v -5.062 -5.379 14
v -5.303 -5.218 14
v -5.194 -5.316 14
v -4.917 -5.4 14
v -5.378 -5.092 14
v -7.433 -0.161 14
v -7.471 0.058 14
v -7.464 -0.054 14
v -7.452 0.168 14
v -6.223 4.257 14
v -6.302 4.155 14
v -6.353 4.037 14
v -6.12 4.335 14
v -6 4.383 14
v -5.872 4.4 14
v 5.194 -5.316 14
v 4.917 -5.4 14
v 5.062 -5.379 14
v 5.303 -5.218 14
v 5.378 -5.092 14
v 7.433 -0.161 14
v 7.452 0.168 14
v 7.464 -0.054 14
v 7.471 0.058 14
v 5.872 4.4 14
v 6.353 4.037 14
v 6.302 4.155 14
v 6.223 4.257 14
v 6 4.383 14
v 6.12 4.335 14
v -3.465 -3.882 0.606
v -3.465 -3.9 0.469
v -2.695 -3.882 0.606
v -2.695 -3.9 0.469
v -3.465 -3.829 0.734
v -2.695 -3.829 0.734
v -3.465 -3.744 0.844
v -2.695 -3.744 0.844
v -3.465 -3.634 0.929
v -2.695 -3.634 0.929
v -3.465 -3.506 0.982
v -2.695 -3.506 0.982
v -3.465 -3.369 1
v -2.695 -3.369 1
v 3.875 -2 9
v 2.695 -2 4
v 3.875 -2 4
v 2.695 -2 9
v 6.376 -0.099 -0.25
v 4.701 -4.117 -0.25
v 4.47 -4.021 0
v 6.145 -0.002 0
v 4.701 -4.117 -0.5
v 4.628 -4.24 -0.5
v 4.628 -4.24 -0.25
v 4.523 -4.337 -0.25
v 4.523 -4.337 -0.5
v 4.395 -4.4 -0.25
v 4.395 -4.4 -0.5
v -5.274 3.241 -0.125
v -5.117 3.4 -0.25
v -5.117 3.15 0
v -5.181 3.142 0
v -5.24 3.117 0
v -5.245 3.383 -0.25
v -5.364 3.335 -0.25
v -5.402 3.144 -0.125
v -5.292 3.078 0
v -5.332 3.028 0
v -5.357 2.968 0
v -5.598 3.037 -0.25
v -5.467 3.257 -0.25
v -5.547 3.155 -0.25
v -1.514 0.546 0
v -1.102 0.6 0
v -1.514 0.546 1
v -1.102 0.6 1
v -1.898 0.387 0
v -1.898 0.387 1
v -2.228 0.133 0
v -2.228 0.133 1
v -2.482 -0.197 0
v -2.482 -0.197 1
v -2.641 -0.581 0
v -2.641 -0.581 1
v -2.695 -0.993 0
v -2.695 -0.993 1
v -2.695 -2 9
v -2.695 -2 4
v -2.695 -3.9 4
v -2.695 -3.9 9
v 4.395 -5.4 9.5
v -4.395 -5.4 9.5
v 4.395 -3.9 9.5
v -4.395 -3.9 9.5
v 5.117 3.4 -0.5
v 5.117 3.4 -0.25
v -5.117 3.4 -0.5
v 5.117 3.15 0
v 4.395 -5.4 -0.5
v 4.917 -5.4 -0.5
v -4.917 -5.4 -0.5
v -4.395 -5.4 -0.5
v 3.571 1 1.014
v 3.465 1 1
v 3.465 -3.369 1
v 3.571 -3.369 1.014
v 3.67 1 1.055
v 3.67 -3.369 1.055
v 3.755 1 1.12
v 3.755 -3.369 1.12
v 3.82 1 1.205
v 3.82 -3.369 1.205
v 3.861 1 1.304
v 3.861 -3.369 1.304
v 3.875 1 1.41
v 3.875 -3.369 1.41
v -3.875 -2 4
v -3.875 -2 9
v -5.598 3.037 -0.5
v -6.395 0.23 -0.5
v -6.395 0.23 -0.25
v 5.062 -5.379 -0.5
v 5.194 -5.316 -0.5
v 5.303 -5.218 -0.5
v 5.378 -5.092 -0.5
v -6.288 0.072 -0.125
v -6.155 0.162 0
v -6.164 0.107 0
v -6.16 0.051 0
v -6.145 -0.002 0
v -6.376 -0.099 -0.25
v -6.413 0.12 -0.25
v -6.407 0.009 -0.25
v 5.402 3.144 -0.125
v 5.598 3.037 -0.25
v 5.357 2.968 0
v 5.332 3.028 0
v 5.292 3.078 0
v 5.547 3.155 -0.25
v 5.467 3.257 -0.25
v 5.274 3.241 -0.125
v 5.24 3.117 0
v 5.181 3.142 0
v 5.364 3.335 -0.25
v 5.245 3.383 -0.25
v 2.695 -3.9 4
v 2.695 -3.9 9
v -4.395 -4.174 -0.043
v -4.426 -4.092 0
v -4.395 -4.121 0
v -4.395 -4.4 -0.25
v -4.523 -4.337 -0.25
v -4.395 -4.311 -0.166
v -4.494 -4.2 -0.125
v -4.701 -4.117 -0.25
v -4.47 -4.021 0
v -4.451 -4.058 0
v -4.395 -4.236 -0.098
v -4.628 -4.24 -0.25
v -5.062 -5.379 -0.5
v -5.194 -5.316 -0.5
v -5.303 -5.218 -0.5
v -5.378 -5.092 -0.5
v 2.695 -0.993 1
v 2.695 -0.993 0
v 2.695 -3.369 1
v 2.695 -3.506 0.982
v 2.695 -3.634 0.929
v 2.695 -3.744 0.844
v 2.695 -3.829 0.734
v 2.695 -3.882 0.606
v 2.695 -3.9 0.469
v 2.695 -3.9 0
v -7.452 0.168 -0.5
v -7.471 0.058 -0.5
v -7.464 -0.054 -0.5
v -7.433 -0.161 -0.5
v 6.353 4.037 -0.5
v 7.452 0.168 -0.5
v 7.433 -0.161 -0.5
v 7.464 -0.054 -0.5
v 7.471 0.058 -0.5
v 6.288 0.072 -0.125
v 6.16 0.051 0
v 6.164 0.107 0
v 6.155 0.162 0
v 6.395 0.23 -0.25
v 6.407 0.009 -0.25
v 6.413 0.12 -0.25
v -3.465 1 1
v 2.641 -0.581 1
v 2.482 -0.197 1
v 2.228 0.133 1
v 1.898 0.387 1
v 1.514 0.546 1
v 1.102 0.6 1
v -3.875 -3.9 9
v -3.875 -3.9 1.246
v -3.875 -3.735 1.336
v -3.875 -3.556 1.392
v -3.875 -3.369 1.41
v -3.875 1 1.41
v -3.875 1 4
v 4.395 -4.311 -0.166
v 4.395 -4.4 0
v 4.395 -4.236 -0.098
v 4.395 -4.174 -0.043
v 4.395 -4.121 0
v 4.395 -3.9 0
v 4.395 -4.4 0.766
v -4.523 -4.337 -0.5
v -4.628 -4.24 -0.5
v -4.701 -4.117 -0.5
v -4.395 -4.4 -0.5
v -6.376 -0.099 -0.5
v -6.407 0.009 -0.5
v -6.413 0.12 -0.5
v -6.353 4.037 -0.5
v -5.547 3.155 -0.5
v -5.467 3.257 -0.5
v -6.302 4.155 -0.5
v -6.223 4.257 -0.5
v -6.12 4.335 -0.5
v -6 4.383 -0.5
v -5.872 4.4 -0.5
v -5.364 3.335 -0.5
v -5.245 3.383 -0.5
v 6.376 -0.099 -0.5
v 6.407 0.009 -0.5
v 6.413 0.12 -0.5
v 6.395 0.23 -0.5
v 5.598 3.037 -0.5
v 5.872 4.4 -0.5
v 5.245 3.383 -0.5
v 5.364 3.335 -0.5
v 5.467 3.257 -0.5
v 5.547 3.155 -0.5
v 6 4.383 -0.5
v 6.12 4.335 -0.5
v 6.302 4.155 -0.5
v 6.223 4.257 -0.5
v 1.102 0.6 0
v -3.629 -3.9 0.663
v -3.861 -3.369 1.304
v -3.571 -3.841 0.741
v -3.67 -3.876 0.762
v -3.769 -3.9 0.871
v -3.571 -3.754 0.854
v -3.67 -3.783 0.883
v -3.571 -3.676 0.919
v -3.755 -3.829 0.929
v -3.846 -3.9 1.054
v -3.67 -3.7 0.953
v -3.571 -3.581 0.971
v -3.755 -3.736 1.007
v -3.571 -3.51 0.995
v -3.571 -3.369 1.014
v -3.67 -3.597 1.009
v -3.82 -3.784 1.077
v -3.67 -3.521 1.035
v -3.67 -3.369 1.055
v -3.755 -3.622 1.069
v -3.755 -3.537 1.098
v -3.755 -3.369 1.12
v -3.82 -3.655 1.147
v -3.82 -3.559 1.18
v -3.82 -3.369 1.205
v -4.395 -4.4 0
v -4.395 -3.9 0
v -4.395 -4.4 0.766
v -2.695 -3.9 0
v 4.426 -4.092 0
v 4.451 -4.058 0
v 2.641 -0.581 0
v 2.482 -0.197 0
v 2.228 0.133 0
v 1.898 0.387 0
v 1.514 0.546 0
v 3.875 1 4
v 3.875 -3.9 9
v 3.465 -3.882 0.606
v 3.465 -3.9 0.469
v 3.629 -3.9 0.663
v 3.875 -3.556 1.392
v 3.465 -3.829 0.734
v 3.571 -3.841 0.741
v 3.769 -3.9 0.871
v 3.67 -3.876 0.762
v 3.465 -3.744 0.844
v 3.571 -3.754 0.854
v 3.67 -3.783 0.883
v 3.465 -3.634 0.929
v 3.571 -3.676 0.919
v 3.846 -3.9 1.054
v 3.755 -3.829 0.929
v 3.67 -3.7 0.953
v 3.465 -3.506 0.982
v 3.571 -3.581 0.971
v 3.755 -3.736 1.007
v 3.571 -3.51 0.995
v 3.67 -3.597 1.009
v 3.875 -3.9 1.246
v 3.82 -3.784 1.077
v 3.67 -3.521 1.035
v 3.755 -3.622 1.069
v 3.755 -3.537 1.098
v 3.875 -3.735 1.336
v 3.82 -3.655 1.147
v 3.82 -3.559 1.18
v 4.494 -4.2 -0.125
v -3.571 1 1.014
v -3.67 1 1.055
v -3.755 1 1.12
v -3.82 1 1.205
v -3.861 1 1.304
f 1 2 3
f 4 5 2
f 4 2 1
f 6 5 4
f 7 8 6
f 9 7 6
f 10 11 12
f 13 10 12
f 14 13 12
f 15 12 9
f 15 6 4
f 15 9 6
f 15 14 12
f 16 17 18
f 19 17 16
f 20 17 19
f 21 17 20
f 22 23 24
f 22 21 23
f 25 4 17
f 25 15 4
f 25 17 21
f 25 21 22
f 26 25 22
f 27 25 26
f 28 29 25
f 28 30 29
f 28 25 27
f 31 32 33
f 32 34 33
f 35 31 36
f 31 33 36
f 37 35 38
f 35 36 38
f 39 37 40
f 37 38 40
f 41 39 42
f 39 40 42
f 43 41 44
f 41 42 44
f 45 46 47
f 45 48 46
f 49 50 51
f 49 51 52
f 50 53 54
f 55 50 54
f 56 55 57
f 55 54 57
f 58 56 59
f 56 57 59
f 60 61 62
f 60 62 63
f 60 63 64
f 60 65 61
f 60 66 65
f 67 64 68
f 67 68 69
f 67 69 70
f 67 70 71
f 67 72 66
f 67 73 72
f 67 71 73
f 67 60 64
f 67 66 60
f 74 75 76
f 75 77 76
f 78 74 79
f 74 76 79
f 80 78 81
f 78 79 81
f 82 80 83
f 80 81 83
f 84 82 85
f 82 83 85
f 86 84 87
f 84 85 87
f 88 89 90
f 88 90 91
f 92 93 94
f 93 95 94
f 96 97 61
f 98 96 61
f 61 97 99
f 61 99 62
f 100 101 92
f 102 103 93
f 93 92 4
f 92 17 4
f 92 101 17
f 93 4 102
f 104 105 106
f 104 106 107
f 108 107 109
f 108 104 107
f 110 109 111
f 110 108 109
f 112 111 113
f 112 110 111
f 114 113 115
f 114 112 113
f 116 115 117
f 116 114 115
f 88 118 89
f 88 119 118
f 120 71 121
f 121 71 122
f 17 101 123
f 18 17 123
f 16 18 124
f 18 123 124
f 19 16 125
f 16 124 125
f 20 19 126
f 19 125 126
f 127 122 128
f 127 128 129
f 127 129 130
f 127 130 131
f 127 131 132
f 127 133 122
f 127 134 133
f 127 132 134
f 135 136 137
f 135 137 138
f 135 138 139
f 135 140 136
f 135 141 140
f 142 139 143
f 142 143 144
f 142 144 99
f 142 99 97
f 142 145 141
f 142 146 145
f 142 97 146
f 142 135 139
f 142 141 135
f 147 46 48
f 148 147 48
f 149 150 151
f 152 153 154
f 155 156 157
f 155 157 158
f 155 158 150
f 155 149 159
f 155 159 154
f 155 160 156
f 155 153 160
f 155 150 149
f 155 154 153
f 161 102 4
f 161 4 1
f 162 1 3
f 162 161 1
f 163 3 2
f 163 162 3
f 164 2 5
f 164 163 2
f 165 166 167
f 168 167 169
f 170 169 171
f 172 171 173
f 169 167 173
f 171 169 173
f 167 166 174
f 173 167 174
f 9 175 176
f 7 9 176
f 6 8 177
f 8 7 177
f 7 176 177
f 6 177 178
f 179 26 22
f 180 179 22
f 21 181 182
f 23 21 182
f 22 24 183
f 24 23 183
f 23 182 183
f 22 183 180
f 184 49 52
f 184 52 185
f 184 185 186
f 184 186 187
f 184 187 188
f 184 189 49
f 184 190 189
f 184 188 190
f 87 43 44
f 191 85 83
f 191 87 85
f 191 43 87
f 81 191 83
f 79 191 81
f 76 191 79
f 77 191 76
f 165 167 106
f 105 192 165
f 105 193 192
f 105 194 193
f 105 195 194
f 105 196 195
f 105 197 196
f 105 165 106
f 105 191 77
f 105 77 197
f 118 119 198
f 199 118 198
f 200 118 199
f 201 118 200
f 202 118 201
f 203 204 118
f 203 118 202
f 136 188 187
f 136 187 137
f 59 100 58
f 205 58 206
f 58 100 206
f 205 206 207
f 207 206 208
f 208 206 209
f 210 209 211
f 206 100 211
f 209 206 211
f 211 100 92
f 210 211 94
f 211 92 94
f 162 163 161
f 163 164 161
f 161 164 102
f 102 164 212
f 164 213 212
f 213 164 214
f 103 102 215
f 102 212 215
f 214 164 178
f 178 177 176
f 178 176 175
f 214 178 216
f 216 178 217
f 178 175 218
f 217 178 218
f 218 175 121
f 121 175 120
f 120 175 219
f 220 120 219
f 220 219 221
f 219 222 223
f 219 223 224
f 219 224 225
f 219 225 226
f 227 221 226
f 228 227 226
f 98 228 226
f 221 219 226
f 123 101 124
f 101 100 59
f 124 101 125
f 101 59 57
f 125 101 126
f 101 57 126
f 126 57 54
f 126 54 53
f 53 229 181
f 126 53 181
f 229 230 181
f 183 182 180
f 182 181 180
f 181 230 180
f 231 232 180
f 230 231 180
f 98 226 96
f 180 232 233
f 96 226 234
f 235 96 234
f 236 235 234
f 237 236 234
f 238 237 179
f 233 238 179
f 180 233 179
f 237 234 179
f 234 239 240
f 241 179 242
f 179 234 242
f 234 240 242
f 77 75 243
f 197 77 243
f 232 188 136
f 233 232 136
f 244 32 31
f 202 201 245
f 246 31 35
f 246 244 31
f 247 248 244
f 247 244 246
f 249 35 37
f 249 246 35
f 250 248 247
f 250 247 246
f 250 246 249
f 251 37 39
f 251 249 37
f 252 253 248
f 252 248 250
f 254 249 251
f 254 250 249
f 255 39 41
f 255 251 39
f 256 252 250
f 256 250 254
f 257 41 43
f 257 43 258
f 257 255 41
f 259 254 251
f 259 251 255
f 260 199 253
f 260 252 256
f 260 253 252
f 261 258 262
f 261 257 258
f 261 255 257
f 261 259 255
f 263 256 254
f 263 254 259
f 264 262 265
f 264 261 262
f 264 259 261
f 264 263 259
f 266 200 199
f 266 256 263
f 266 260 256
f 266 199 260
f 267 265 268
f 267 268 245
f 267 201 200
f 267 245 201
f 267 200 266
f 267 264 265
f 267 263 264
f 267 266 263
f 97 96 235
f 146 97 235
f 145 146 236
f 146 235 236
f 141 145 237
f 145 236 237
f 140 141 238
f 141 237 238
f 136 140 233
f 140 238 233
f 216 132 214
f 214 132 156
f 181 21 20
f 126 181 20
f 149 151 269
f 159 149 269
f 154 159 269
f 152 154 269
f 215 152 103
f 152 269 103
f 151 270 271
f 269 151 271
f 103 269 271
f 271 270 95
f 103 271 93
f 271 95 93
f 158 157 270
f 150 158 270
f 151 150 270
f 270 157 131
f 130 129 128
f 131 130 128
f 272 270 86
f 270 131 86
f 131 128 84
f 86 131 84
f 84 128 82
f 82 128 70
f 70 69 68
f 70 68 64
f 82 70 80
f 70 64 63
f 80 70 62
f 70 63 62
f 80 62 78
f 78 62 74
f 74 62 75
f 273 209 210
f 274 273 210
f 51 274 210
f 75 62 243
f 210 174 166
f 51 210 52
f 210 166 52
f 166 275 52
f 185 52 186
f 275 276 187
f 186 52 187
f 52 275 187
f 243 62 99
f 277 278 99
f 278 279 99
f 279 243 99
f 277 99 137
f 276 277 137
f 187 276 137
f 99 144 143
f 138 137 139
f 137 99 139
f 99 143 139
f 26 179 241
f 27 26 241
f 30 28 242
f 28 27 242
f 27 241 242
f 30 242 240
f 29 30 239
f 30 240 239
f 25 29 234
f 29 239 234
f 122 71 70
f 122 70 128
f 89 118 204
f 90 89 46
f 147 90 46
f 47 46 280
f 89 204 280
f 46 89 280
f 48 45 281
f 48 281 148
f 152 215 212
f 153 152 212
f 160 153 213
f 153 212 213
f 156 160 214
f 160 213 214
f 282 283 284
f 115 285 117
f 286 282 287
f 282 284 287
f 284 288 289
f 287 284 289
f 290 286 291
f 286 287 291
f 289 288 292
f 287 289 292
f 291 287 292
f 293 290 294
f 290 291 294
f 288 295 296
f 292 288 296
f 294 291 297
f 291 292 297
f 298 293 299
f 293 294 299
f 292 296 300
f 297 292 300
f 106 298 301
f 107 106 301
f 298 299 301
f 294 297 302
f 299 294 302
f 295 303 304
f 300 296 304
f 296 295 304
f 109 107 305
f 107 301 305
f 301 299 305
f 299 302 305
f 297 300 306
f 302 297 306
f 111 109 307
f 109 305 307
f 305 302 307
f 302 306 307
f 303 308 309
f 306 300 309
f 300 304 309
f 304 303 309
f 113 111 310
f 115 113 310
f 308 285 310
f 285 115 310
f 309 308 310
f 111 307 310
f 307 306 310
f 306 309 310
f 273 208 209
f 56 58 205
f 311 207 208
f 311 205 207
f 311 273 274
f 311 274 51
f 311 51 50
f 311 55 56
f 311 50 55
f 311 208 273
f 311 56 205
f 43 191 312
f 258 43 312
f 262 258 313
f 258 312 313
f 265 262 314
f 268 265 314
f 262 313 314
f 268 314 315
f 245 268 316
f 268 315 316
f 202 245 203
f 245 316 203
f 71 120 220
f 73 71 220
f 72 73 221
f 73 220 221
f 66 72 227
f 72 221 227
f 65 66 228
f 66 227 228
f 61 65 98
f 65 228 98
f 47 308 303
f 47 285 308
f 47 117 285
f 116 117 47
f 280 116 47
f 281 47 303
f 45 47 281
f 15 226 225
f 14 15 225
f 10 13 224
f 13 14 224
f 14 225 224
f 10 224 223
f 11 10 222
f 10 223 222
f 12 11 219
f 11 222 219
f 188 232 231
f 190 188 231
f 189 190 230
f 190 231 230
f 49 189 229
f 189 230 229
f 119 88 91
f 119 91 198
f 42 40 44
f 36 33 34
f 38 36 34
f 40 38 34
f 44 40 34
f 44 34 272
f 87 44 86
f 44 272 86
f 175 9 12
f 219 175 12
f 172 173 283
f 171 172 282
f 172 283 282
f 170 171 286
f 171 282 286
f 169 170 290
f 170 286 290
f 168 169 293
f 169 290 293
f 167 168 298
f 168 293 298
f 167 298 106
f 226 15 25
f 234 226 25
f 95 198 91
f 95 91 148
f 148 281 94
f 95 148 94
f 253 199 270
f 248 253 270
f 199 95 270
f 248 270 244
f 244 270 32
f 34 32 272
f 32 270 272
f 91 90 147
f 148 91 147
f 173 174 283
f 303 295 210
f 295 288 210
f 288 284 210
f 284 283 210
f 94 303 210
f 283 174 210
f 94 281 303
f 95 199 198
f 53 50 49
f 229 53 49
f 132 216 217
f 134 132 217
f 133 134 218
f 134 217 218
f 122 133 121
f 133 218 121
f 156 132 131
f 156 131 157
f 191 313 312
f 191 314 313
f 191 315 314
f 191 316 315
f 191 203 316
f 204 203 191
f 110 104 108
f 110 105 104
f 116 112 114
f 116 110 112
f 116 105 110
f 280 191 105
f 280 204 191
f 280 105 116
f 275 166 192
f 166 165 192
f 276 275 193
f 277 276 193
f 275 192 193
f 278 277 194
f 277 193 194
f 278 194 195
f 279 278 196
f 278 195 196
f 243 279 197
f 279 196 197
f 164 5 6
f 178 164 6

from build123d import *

# Parameters (mm, degrees)
F1_DEPTH      = 14
F3_START      = 2
F3_DEPTH      = 9.7
F4_DEPTH      = 1
F4_DEPTH_BACK = 22
F5_START      = 9.5
F5_DEPTH      = 4.5
F6_DEPTH      = 4.5
F8_DEPTH      = 0.5
F9_R          = 1.5933809512
F10_R         = 0.5311269837
F11_T1_DEPTH  = 5.3949137803
F11_T6_ANGLE  = 200.7294916834
F11_T12_ANGLE = 200.7294916834
F12_T1_DEPTH  = 1.2663530932
F12_T3_DEPTH  = 0.9362653772
F12_T5_DEPTH  = 1.4443499817
F12_T7_DEPTH  = 1.4443499817
F12_T9_DEPTH  = 0.9362653772
F12_T11_DEPTH = 1.2663530932
F12_T13_DEPTH = 16.1666666667
F12_T15_DEPTH = 16.1666666667
F12_T17_DEPTH = 15.3725307543
F12_T19_DEPTH = 16.3886999634
F12_T21_DEPTH = 16.3886999634
F12_T23_DEPTH = 15.3725307543
F13_SIZE      = 0.25


# Not quite as in the source:
# - a fillet or chamfer that OpenCascade refuses, or shapes differently, is made with other operations: its cross-section is extruded or revolved along the edge and cut away or added


with BuildPart() as f1:
    # F0 (on Top) → F1 (new body)
    with BuildSketch(Plane.XY):
        Polygon((6.25, 4.4), (0, 4.4), (-6.25, 4.4), (-7.5, 0), (-5.25, -5.4), (-4.395, -5.4), (-4.395, -3.9), (-2.695, -3.9), (-2.695, 0.6), (0, 0.6), (2.695, 0.6), (2.695, -3.9), (4.395, -3.9), (4.395, -5.4), (5.25, -5.4), (7.5, 0), align=None)
    extrude(amount=F1_DEPTH)

    # F2 (on Front) → F3 (cut)
    with BuildSketch(Plane.XZ.offset(F3_START)):
        Polygon((0, 4), (3.875, 4), (3.875, 9), (0, 9), (-3.875, 9), (-3.875, 4), align=None)
    extrude(amount=F3_DEPTH, mode=Mode.SUBTRACT)

    # F2 (on Front) → F4 (cut, two sides)
    with BuildSketch(Plane.XZ) as f4_sk:
        Polygon((-3.875, 1), (0, 1), (3.875, 1), (3.875, 4), (0, 4), (-3.875, 4), align=None)
    extrude(amount=-F4_DEPTH, mode=Mode.SUBTRACT)
    extrude(f4_sk.sketch, amount=F4_DEPTH_BACK, mode=Mode.SUBTRACT)

    # F0 (on Top) → F5 (join)
    with BuildSketch(Plane.XY.offset(F5_START)):
        Polygon((0, -5.4), (4.395, -5.4), (4.395, -3.9), (2.695, -3.9), (2.695, 0.6), (0, 0.6), (-2.695, 0.6), (-2.695, -3.9), (-4.395, -3.9), (-4.395, -5.4), align=None)
    extrude(amount=F5_DEPTH)

    # F6 (add): a face of the model
    f6_faces = [f1.faces().sort_by_distance(p)[0] for p in [
        (0, 0.6, 6.75),
    ]]
    extrude(f6_faces, amount=F6_DEPTH)

    # F7 (on face) → F8 (join)
    with BuildSketch(Plane(origin=(0, 0, 0), x_dir=(1, 0, 0), z_dir=(0, 0, -1))):
        Polygon((4.395, 5.4), (4.395, 4.4), (4.5833333333, 4.4), (6.4426875763, -0.062450183), (5.4945200146, -3.4), (-5.4945200146, -3.4), (-6.4426875763, -0.062450183), (-4.5833333333, 4.4), (-4.395, 4.4), (-4.395, 5.4), (-5.25, 5.4), (-7.5, 0), (-6.25, -4.4), (6.25, -4.4), (7.5, 0), (5.25, 5.4), align=None)
    extrude(amount=F8_DEPTH)

    # F9
    f9_edges = [f1.edges().sort_by_distance(p)[0] for p in [
        (2.695, 0.6, 0.5),
        (-2.695, 0.6, 0.5),
    ]]
    fillet(f9_edges, radius=F9_R)

    # F10
    f10_edges = [f1.edges().sort_by_distance(p)[0] for p in [
        (-3.285, -3.9, 1),
        (3.285, -3.9, 1),
    ]]
    fillet(f10_edges, radius=F10_R)

    # F11: fillet of radius 0.4104163056 on 2 edges, made by hand

    # F11_s2 → F11_t1 (join)
    with BuildSketch(Plane.XZ.offset(-2.026040764)):
        with BuildLine():
            ThreePointArc((3.4645836944, 1), (3.7547918472, 1.1202081528), (3.875, 1.4104163056))
            Line((3.875, 1.4104163056), (3.875, 1))
            Line((3.875, 1), (3.4645836944, 1))
        make_face()
        with BuildLine():
            ThreePointArc((-3.4645836944, 1), (-3.7547918472, 1.1202081528), (-3.875, 1.4104163056))
            Line((-3.875, 1.4104163056), (-3.875, 1))
            Line((-3.875, 1), (-3.4645836944, 1))
        make_face()
    extrude(amount=F11_T1_DEPTH)


with BuildPart() as f11_tool4:
    # F11_s5 → F11_t6 (revolve)
    with BuildSketch(Plane(origin=(0, -2.7915869666, -1.0564952052), x_dir=(1, 0, 0), z_dir=(0, 0.9352619639, 0.3539562952))):
        with BuildLine():
            ThreePointArc((-3.4645836944, -1.0998259262), (-3.7547918472, -0.9796177734), (-3.875, -0.6894096206))
            Line((-3.875, -0.6894096206), (-3.875, -1.0998259262))
            Line((-3.875, -1.0998259262), (-3.4645836944, -1.0998259262))
        make_face()
    revolve(axis=Axis((-3.875, -3.3688730163, 0.4688730163), (-1, 0, 0)), revolution_arc=F11_T6_ANGLE)

    split(bisect_by=Plane.XZ.offset(3.9), keep=Keep.BOTTOM)

    split(bisect_by=Plane.XY, keep=Keep.TOP)


with BuildPart() as f1_1:
    add(f1.part)

    # F11_t3: union F11_tool4
    add(f11_tool4.part)


with BuildPart() as f11_tool10:
    # F11_s11 → F11_t12 (revolve)
    with BuildSketch(Plane(origin=(0, -2.7915869666, -1.0564952052), x_dir=(1, 0, 0), z_dir=(0, 0.9352619639, 0.3539562952))):
        with BuildLine():
            ThreePointArc((3.4645836944, -1.0998259262), (3.7547918472, -0.9796177734), (3.875, -0.6894096206))
            Line((3.875, -0.6894096206), (3.875, -1.0998259262))
            Line((3.875, -1.0998259262), (3.4645836944, -1.0998259262))
        make_face()
    revolve(axis=Axis((3.875, -3.3688730163, 0.4688730163), (-1, 0, 0)), revolution_arc=F11_T12_ANGLE)

    split(bisect_by=Plane.XZ.offset(3.9), keep=Keep.BOTTOM)

    split(bisect_by=Plane.XY, keep=Keep.TOP)


with BuildPart() as f1_2:
    add(f1_1.part)

    # F11_t9: union F11_tool10
    add(f11_tool10.part)

    # F12: fillet of radius 0.5 on 12 edges, made by hand

    # F12_s2 → F12_t1 (join)
    with BuildSketch(Plane.XY.offset(-0.5)):
        with BuildLine():
            ThreePointArc((-4.395, -4.4), (-4.5790190998, -4.2919632329), (-4.7012338092, -4.1170388579))
            Line((-4.7012338092, -4.1170388579), (-4.5833333333, -4.4))
            Line((-4.5833333333, -4.4), (-4.395, -4.4))
        make_face()
    extrude(amount=F12_T1_DEPTH)

    # F12_s4 → F12_t3 (join)
    with BuildSketch(Plane.XY.offset(-0.5)):
        with BuildLine():
            ThreePointArc((-6.3755698259, -0.0986324178), (-6.4131614706, 0.0641941432), (-6.3949990431, 0.2303138196))
            Line((-6.3949990431, 0.2303138196), (-6.4426875763, 0.062450183))
            Line((-6.4426875763, 0.062450183), (-6.3755698259, -0.0986324178))
        make_face()
    extrude(amount=F12_T3_DEPTH)

    # F12_s6 → F12_t5 (join)
    with BuildSketch(Plane.XY.offset(-0.5)):
        with BuildLine():
            ThreePointArc((-5.5977477007, 3.0366385451), (-5.4181773738, 3.2989481624), (-5.1167800219, 3.4))
            Line((-5.1167800219, 3.4), (-5.4945200146, 3.4))
            Line((-5.4945200146, 3.4), (-5.5977477007, 3.0366385451))
        make_face()
    extrude(amount=F12_T5_DEPTH)

    # F12_s8 → F12_t7 (join)
    with BuildSketch(Plane.XY.offset(-0.5)):
        with BuildLine():
            ThreePointArc((5.1167800219, 3.4), (5.4181773738, 3.2989481624), (5.5977477007, 3.0366385451))
            Line((5.5977477007, 3.0366385451), (5.4945200146, 3.4))
            Line((5.4945200146, 3.4), (5.1167800219, 3.4))
        make_face()
    extrude(amount=F12_T7_DEPTH)

    # F12_s10 → F12_t9 (join)
    with BuildSketch(Plane.XY.offset(-0.5)):
        with BuildLine():
            ThreePointArc((6.3949990431, 0.2303138196), (6.4131614706, 0.0641941432), (6.3755698259, -0.0986324178))
            Line((6.3755698259, -0.0986324178), (6.4426875763, 0.062450183))
            Line((6.4426875763, 0.062450183), (6.3949990431, 0.2303138196))
        make_face()
    extrude(amount=F12_T9_DEPTH)

    # F12_s12 → F12_t11 (join)
    with BuildSketch(Plane.XY.offset(-0.5)):
        with BuildLine():
            ThreePointArc((4.7012338092, -4.1170388579), (4.5790190998, -4.2919632329), (4.395, -4.4))
            Line((4.395, -4.4), (4.5833333333, -4.4))
            Line((4.5833333333, -4.4), (4.7012338092, -4.1170388579))
        make_face()
    extrude(amount=F12_T11_DEPTH)

    # F12_s14 → F12_t13 (cut)
    with BuildSketch(Plane.XY.offset(-1.3333333333)):
        with BuildLine():
            ThreePointArc((-4.9166666667, -5.4), (-5.1940167648, -5.3160251472), (-5.3782051282, -5.0923076923))
            Line((-5.3782051282, -5.0923076923), (-5.25, -5.4))
            Line((-5.25, -5.4), (-4.9166666667, -5.4))
        make_face()
    extrude(amount=F12_T13_DEPTH, mode=Mode.SUBTRACT)

    # F12_s16 → F12_t15 (cut)
    with BuildSketch(Plane.XY.offset(-1.3333333333)):
        with BuildLine():
            ThreePointArc((4.9166666667, -5.4), (5.1940167648, -5.3160251472), (5.3782051282, -5.0923076923))
            Line((5.3782051282, -5.0923076923), (5.25, -5.4))
            Line((5.25, -5.4), (4.9166666667, -5.4))
        make_face()
    extrude(amount=F12_T15_DEPTH, mode=Mode.SUBTRACT)

    # F12_s18 → F12_t17 (cut)
    with BuildSketch(Plane.XY.offset(-0.9362653772)):
        with BuildLine():
            ThreePointArc((7.4328822497, -0.1610826008), (7.4704738943, 0.0017439601), (7.4523114669, 0.1678636366))
            Line((7.4523114669, 0.1678636366), (7.5, 0))
            Line((7.5, 0), (7.4328822497, -0.1610826008))
        make_face()
    extrude(amount=F12_T17_DEPTH, mode=Mode.SUBTRACT)

    # F12_s20 → F12_t19 (cut)
    with BuildSketch(Plane.XY.offset(-1.4443499817)):
        with BuildLine():
            ThreePointArc((6.3532276861, 4.0366385451), (6.1736573592, 4.2989481624), (5.8722600073, 4.4))
            Line((5.8722600073, 4.4), (6.25, 4.4))
            Line((6.25, 4.4), (6.3532276861, 4.0366385451))
        make_face()
    extrude(amount=F12_T19_DEPTH, mode=Mode.SUBTRACT)

    # F12_s22 → F12_t21 (cut)
    with BuildSketch(Plane.XY.offset(-1.4443499817)):
        with BuildLine():
            ThreePointArc((-5.8722600073, 4.4), (-6.1736573592, 4.2989481624), (-6.3532276861, 4.0366385451))
            Line((-6.3532276861, 4.0366385451), (-6.25, 4.4))
            Line((-6.25, 4.4), (-5.8722600073, 4.4))
        make_face()
    extrude(amount=F12_T21_DEPTH, mode=Mode.SUBTRACT)

    # F12_s24 → F12_t23 (cut)
    with BuildSketch(Plane.XY.offset(-0.9362653772)):
        with BuildLine():
            ThreePointArc((-7.4523114669, 0.1678636366), (-7.4704738943, 0.0017439601), (-7.4328822497, -0.1610826008))
            Line((-7.4328822497, -0.1610826008), (-7.5, 0))
            Line((-7.5, 0), (-7.4523114669, 0.1678636366))
        make_face()
    extrude(amount=F12_T23_DEPTH, mode=Mode.SUBTRACT)

    # F13
    f13_edges = [f1_2.edges().sort_by_distance(p)[0] for p in [
        (-5.996373, 1.633476, 0),
        (-5.418177, 3.298948, 0),
        (-6.413161, 0.064194, 0),
        (-5.538402, -2.107836, 0),
        (-4.579019, -4.291963, 0),
        (4.579019, -4.291963, 0),
        (5.538402, -2.107836, 0),
        (6.413161, 0.064194, 0),
        (5.996373, 1.633476, 0),
        (5.418177, 3.298948, 0),
        (0, 3.4, 0),
    ]]
    chamfer(f13_edges, length=F13_SIZE)


solid = f1_2.part
